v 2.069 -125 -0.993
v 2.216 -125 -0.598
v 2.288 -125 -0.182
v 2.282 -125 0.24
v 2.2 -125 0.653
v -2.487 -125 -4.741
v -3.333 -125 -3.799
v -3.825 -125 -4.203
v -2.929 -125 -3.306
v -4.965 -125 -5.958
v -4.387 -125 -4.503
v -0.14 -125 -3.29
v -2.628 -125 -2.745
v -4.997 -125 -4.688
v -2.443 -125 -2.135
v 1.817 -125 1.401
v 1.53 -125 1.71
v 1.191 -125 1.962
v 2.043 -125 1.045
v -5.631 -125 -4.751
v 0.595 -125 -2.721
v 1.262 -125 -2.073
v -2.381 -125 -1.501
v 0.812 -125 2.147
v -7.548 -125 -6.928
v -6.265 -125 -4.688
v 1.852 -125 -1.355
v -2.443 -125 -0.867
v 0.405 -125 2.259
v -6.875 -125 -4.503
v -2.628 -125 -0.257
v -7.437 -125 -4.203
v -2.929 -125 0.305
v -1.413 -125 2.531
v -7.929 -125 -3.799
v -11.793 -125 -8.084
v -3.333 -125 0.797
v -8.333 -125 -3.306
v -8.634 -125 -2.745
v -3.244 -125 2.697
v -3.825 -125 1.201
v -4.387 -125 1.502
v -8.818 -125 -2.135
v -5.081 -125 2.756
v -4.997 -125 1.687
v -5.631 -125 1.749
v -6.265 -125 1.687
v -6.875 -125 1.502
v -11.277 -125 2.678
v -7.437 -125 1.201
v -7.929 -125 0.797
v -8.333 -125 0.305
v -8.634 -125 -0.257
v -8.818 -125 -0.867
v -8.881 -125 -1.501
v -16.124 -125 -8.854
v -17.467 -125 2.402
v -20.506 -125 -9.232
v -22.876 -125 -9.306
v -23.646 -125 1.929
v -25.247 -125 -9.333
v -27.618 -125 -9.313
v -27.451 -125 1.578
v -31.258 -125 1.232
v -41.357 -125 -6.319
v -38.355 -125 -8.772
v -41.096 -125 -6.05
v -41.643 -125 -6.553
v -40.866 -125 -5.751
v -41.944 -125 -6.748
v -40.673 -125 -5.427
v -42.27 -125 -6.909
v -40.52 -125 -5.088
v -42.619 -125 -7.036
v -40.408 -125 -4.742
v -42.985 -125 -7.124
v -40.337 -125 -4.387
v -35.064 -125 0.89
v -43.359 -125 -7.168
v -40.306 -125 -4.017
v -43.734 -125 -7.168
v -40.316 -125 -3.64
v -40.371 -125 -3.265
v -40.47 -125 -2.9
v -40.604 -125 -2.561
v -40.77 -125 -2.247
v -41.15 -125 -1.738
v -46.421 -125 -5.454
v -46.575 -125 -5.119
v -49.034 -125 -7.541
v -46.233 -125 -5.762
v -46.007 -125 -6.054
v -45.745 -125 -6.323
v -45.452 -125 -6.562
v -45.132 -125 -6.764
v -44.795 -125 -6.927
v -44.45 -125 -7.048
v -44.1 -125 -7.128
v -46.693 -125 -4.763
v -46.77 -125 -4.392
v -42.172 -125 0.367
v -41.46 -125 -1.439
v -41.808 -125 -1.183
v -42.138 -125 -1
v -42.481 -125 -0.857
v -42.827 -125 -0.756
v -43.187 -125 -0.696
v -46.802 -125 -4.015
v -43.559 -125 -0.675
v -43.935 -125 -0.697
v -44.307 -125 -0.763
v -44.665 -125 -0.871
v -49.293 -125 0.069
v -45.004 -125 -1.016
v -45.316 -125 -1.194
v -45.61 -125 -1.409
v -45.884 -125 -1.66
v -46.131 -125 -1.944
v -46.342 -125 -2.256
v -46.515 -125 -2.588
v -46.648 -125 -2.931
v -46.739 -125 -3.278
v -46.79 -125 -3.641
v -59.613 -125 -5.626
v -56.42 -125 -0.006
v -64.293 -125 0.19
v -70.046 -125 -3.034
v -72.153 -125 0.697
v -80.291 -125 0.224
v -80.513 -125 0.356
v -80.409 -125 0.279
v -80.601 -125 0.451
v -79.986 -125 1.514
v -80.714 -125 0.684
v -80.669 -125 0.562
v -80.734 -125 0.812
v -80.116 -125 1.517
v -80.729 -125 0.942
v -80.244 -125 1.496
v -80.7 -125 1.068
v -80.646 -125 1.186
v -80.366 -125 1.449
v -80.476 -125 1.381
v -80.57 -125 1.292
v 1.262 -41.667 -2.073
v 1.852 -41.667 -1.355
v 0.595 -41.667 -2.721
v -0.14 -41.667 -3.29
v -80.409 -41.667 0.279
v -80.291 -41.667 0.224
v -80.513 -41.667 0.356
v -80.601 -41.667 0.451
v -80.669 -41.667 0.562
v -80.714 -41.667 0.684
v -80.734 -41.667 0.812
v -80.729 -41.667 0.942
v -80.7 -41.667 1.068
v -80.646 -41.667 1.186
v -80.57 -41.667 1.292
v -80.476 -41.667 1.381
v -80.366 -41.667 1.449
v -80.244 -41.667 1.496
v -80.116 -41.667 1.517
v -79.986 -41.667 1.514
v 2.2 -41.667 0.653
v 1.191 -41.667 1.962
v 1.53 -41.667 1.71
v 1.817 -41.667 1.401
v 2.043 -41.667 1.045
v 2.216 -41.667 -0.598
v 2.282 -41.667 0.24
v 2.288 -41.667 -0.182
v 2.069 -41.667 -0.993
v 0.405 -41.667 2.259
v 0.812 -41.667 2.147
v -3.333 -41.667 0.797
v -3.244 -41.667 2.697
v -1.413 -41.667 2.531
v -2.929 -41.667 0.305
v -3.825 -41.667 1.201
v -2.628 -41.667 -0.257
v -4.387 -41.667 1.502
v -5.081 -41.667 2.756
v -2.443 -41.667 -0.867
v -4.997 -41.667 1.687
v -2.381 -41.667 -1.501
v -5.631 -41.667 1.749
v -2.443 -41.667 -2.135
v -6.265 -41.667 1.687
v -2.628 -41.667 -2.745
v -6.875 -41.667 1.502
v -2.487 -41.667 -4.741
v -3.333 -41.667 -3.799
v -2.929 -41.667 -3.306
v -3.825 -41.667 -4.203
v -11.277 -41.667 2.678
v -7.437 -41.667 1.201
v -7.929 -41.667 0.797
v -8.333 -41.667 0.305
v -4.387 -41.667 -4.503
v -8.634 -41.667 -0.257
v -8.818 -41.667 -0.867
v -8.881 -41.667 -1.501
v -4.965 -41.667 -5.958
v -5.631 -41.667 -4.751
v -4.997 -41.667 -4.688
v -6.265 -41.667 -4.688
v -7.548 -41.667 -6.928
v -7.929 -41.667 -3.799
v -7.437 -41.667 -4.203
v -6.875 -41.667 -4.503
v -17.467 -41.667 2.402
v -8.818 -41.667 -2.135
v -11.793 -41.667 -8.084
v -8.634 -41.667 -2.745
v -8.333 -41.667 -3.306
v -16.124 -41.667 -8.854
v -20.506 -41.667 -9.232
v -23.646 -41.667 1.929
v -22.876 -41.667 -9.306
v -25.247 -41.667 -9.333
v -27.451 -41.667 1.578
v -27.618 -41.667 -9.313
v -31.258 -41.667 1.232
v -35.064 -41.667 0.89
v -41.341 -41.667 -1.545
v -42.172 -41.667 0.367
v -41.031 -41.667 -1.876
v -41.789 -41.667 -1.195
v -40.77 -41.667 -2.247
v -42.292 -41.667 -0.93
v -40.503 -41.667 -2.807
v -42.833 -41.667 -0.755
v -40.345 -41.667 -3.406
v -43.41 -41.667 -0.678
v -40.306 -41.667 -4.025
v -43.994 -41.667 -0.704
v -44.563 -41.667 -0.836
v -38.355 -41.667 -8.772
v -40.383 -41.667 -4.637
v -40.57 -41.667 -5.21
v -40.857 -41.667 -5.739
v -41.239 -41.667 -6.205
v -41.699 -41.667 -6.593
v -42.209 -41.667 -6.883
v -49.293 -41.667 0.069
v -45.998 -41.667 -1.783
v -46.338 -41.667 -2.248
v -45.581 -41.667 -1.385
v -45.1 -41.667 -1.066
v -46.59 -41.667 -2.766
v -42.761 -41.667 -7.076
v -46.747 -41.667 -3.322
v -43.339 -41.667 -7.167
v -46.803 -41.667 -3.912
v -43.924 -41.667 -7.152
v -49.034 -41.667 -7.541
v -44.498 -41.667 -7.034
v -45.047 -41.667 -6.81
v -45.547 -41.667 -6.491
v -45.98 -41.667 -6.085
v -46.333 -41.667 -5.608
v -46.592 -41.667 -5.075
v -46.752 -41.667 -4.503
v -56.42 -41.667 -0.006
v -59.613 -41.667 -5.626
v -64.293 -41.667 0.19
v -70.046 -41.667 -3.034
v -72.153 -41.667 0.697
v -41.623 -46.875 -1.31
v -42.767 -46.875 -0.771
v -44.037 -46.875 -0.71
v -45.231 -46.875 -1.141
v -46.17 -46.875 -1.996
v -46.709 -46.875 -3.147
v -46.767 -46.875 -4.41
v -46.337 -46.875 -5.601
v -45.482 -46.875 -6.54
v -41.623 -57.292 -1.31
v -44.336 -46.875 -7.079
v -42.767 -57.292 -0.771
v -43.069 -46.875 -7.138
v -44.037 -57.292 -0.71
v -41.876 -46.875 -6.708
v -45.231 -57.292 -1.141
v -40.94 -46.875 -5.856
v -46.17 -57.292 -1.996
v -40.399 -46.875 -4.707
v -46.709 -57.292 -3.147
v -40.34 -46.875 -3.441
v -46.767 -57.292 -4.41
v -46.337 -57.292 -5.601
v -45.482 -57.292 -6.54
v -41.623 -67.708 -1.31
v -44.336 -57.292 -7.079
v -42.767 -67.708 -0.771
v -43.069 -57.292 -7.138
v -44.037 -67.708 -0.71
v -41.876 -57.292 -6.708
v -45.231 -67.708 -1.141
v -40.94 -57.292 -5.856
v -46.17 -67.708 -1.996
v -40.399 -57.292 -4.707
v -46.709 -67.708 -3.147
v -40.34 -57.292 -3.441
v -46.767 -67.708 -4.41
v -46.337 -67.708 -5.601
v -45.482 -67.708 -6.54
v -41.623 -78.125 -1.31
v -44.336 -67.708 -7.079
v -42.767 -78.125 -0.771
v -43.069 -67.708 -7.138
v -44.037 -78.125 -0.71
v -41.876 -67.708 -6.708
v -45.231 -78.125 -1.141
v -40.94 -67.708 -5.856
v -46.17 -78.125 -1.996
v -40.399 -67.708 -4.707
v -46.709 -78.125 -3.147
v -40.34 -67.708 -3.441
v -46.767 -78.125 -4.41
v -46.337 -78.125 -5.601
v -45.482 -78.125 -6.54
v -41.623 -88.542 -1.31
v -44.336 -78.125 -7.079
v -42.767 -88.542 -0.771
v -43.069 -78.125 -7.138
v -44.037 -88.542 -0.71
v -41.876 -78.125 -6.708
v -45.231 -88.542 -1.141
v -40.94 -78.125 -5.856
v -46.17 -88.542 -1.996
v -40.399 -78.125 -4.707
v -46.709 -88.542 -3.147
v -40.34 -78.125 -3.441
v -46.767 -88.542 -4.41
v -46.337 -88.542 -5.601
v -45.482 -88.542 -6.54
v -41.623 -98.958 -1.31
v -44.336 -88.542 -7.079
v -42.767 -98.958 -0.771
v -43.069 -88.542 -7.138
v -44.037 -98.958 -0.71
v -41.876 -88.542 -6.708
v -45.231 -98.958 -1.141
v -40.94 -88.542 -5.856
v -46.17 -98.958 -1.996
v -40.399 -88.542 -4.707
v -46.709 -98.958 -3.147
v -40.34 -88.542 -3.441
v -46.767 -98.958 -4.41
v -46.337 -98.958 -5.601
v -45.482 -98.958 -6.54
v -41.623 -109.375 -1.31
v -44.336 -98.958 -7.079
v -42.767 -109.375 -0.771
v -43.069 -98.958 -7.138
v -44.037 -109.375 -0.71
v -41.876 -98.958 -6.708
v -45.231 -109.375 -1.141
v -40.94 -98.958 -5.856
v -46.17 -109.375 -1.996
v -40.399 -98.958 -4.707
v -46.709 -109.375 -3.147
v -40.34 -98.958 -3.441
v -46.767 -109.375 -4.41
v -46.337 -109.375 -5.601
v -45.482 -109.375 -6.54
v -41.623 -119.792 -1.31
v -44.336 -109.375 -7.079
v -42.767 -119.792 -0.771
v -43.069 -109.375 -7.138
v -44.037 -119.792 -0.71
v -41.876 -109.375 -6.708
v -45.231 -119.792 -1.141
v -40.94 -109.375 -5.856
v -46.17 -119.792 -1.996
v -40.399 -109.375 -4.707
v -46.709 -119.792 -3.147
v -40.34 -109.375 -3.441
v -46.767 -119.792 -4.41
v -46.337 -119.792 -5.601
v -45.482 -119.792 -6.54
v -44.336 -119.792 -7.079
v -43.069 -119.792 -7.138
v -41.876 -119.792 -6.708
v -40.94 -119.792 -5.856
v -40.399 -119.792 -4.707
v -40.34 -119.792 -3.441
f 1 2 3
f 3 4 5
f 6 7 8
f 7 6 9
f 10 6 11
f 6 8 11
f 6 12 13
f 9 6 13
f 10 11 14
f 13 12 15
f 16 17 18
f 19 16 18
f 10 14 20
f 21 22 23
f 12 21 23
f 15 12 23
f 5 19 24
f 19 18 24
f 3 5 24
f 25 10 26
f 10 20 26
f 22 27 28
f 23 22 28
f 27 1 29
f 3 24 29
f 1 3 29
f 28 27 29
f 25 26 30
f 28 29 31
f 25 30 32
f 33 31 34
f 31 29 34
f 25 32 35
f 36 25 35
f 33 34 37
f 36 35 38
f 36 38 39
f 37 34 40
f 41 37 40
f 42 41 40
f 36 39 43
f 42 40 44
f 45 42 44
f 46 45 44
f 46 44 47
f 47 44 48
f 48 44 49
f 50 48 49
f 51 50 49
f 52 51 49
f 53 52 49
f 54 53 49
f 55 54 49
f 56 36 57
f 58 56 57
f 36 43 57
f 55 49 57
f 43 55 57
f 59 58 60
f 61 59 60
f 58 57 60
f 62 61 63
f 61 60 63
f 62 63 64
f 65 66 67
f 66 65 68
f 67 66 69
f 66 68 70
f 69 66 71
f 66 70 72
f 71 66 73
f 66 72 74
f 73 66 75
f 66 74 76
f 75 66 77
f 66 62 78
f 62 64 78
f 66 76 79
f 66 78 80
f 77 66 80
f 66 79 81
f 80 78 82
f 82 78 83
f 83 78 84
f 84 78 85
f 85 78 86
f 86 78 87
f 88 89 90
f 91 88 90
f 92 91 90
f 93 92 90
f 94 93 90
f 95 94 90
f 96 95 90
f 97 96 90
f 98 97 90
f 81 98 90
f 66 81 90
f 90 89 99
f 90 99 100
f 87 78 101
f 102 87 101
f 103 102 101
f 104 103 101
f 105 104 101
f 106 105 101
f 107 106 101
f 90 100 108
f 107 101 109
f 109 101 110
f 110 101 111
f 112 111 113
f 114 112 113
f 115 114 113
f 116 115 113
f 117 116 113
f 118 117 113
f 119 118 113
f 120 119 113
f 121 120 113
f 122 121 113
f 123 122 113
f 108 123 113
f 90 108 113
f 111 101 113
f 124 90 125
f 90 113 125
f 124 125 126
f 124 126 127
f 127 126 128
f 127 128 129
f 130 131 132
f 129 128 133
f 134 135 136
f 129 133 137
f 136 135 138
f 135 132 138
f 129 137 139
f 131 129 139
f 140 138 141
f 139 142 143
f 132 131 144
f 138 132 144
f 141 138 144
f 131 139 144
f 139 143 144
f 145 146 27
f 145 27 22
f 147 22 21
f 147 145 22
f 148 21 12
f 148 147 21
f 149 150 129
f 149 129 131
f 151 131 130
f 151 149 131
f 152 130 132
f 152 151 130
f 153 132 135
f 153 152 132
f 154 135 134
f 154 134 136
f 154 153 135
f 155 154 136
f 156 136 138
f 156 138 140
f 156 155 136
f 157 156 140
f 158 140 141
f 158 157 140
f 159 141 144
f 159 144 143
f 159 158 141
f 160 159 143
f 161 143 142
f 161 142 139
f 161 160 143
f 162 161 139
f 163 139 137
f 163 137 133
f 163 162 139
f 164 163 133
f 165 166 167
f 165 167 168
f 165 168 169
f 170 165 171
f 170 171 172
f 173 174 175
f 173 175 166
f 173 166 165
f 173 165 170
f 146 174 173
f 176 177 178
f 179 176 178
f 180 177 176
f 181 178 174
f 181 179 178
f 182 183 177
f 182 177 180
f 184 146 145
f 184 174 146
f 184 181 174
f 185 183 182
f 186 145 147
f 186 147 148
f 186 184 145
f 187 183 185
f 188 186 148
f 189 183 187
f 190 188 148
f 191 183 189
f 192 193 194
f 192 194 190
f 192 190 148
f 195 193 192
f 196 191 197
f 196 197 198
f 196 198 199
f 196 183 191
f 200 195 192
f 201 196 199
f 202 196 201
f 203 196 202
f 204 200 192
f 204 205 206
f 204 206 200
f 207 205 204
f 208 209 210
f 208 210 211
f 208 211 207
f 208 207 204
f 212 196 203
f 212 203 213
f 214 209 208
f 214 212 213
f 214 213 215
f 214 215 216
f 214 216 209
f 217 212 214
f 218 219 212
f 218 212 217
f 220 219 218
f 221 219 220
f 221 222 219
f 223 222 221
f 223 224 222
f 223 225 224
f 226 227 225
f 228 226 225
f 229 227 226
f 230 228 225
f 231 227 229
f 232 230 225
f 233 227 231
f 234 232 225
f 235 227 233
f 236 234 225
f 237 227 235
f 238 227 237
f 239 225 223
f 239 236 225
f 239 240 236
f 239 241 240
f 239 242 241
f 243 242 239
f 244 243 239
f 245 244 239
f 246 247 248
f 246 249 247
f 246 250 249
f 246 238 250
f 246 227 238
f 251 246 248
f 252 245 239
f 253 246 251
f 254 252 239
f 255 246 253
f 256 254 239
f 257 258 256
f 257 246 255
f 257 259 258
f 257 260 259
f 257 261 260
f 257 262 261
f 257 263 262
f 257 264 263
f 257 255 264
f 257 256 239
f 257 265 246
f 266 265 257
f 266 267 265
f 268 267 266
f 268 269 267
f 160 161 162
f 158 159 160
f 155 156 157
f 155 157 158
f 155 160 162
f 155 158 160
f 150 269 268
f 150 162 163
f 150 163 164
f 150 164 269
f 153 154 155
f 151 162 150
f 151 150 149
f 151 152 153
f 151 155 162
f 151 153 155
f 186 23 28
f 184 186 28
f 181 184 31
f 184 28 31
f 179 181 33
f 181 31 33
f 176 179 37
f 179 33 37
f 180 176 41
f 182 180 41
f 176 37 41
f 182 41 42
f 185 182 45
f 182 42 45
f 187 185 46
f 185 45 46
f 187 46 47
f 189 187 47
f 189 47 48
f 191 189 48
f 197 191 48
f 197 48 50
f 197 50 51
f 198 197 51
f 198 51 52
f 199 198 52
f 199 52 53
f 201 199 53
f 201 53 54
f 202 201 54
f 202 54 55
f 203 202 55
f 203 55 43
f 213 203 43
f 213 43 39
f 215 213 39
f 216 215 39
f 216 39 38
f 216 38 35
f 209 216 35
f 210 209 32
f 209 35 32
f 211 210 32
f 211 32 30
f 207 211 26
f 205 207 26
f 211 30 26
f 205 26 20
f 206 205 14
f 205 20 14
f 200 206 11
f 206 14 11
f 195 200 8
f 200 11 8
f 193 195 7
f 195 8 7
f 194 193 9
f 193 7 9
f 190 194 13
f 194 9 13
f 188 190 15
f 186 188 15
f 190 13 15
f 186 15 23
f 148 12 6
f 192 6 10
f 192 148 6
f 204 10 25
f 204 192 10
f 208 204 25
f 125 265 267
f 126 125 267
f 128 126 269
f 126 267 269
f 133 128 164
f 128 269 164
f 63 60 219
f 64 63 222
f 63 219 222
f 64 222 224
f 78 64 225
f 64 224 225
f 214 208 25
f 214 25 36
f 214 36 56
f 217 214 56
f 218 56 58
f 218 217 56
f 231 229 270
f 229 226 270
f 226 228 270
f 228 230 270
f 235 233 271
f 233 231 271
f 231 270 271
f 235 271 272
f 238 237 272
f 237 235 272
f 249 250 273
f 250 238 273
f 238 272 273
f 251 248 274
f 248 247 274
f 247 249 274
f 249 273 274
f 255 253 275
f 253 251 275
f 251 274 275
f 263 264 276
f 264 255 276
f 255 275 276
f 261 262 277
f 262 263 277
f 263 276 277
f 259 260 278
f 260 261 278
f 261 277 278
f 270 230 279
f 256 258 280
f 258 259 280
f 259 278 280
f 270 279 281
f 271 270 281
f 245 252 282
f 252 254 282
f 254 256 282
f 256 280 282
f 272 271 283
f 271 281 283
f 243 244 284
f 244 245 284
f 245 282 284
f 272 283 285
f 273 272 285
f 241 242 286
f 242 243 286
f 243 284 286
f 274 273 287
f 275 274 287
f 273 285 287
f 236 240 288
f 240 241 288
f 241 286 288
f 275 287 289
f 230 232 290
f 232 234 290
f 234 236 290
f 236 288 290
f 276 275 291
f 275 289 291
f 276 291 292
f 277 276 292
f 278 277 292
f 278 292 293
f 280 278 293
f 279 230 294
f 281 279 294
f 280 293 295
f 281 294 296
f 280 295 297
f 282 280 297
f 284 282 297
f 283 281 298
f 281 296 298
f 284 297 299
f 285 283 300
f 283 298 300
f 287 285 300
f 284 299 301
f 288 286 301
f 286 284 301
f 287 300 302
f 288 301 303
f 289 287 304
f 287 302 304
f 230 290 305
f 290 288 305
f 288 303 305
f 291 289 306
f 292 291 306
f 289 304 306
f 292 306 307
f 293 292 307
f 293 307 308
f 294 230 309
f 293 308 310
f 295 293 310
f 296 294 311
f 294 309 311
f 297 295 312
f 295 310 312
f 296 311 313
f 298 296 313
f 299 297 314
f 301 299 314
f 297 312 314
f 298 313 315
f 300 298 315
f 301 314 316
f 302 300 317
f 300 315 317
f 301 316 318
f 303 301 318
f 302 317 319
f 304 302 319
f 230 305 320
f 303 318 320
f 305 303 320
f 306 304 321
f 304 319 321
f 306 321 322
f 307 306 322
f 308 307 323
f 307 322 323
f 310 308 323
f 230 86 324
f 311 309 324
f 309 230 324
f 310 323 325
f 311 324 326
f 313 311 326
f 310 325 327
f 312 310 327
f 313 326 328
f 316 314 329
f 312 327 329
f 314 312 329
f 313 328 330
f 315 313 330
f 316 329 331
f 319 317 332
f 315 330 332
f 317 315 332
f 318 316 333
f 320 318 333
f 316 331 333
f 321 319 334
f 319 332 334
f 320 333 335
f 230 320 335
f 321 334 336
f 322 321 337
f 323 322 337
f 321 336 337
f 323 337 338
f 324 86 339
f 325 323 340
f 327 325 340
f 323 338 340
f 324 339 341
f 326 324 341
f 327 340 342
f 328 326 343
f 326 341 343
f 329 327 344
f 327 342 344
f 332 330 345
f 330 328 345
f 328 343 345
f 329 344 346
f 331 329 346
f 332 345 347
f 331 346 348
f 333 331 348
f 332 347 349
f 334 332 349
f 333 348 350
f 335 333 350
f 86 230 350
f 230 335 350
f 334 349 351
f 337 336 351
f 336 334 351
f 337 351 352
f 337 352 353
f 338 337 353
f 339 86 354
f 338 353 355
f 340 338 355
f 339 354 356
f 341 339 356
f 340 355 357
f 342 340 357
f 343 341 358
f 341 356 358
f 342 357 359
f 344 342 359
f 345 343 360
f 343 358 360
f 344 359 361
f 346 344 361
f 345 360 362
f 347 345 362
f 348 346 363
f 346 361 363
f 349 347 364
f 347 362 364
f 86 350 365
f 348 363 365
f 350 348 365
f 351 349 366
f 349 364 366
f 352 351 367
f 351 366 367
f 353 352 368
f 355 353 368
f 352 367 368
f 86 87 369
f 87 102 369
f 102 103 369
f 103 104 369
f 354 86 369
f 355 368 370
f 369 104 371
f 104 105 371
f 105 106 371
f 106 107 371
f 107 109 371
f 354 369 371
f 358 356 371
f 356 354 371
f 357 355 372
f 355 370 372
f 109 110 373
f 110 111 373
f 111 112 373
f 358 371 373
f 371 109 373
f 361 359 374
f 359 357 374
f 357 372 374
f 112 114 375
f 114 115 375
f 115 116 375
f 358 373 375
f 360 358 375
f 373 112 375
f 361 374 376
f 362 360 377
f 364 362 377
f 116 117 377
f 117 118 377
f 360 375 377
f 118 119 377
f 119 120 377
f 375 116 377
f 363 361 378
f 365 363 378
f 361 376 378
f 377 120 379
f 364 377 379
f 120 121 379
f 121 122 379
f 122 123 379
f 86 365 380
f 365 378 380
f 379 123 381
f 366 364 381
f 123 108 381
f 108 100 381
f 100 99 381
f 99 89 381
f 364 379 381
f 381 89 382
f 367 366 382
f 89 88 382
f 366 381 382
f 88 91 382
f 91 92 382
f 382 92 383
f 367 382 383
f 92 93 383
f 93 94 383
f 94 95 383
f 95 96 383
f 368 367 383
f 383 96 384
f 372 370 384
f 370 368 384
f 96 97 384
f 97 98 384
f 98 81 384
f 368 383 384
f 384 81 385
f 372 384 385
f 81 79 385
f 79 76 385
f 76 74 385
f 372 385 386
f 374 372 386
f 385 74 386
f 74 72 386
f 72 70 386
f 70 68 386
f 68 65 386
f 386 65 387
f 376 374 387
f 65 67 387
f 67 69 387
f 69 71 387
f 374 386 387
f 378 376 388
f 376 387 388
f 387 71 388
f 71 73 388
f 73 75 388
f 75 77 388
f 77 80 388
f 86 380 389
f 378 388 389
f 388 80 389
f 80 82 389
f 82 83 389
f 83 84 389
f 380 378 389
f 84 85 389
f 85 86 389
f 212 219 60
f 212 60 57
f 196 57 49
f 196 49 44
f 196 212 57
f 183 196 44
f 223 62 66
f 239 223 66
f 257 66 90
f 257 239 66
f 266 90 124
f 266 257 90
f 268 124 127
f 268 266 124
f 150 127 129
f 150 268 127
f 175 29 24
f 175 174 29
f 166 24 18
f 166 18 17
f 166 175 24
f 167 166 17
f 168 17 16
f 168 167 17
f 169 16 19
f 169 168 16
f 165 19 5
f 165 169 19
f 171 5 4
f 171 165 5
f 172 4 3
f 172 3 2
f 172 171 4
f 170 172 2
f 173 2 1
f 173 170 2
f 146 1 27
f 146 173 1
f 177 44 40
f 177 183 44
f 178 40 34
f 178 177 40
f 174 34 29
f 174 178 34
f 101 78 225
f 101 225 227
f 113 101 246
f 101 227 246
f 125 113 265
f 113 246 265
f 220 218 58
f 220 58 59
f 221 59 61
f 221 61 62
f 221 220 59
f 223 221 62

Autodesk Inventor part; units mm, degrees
ref_plane "YZ Plane" through (0, 0, 0) normal (1, 0, 0) x (0, 1, 0)
ref_plane "XZ Plane" through (0, 0, 0) normal (0, 1, 0) x (-1, 0, 0)
sketch "スケッチ1" plane through (0, 0, 0) normal (0, 1, 0) x (-1, 0, 0)
  circle A0 centre (56.6667, -3.3333) radius 2 projected
  circle A1 centre (6.6667, -1.3333) radius 2 projected
  arc A2 (27.618, -9.313) -> (80.2911, 0.2239) centre (24.5838, 157.671) ccw projected
  arc A3 (20.5062, -9.2317) -> (27.618, -9.313) centre (25.435, 110.8283) ccw projected
  arc A4 (7.5483, -6.9284) -> (20.5062, -9.2317) centre (22.5133, 39.66) ccw projected
  arc A5 (0.14, -3.2897) -> (7.5483, -6.9284) centre (16.2383, 20.125) ccw projected
  arc A6 (-1.8521, -1.3552) -> (0.14, -3.2897) centre (4.8333, 3.5367) ccw projected
  arc A7 (-0.4054, 2.2589) -> (-1.8521, -1.3552) centre (0, 0) ccw projected
  arc A8 (5.081, 2.7563) -> (-0.4054, 2.2589) centre (5.1833, -28.88) ccw projected
  arc A9 (23.6457, 1.9287) -> (5.081, 2.7563) centre (5.71, -191.7767) ccw projected
  arc A10 (23.6457, 1.9287) -> (35.0642, 0.89) centre (351.2983, 3540.5833) ccw projected
  arc A11 (35.0642, 0.89) -> (56.4197, -0.0064) centre (55.24, 226.7233) ccw projected
  arc A12 (56.4197, -0.0064) -> (79.9865, 1.514) centre (55.3817, 199.4967) ccw projected
  arc A13 (80.2911, 0.2239) -> (79.9865, 1.514) centre (80.0687, 0.8524) ccw projected
extrude "押し出し1" add sketch "スケッチ1" along normal mid plane 250 contours A0 | A1 | A3 A4 A5 A6 A7 A8 A9 A10 A11 A12 A13 A2
ref_plane "作業平面1" through (-121.5758, 135, -17.9326) normal (0.516, 0, -0.8566) x (0.8566, 0, 0.516)
sketch "スケッチ4" plane through (-121.5758, 135, -17.9326) normal (0.516, 0, -0.8566) x (0.8566, 0, 0.516)
  arc A0 (90, 35) -> (0, 0) centre (90, -98.2143) ccw projected
  line L0 (183.3333, 35) -> (90, 35) projected
  line L1 (183.3333, 35) -> (183.3333, 0)
  line L2 (183.3333, 0) -> (0, 0)
  point P0 (113.3913, 135)
extrude "押し出し4" cut sketch "スケッチ4" along normal through all
sketch "スケッチ5" plane through (0, 0, 0) normal (1, 0, 0) x (0, 1, 0)
  line L0 (0, 39.4691) -> (142.1366, 39.4691)
  line L1 (142.1366, 39.4691) -> (142.1366, -52.6862)
  line L2 (142.1366, -52.6862) -> (0, -52.6862)
  line L3 (0, -52.6862) -> (0, 39.4691)
  line L4 (-125, 0.2239) -> (-125, -9.313) projected
  line L5 (-125, -9.313) -> (-125, -9.2317) projected
  line L6 (-125, -9.2317) -> (-125, -6.9284) projected
  line L7 (-125, -6.9284) -> (-125, -3.2897) projected
  line L8 (-125, -3.2897) -> (-125, -1.3552) projected
  line L9 (-125, -1.3552) -> (-125, 2.2589) projected
  line L10 (-125, 2.2589) -> (-125, 2.7563) projected
  line L11 (-125, 2.7563) -> (-125, 1.9287) projected
  line L12 (-125, 1.9287) -> (-125, 0.89) projected
  line L13 (-125, 0.89) -> (-125, -0.0064) projected
  line L14 (-125, -0.0064) -> (-125, 1.514) projected
  line L15 (-125, 1.514) -> (-125, 0.2239) projected
  line L16 (0, -36.0696) -> (0, 32.8586) projected
  line L17 (0, 32.7819) -> (-41.6667, 32.7819)
  line L18 (-41.6667, 32.7819) -> (-41.6667, -50.6187)
  line L19 (-41.6667, -50.6187) -> (0, -50.6187)
  line L20 (0, -50.6187) -> (0, 32.7819)
  point P0 (0, 0)
  dimension "d19" = 41.6667
extrude "押し出し5" cut sketch "スケッチ5" along normal through all both and the other way through all
sketch "スケッチ6" plane through (0, -125, 0) normal (0, -1, 0) x (1, 0, 0)
  spline S0 degree 3 poles (-40.7697, -2.2472) (-40.9802, -1.8978) (-41.2745, -1.5673) (-41.9707, -1.053) (-42.3727, -0.8692) (-43.1649, -0.6717) (-43.6081, -0.6459) (-44.4664, -0.7751) (-44.8814, -0.9301) (-45.5808, -1.3514) (-45.9119, -1.6464) (-46.4272, -2.3453) (-46.6113, -2.7493) (-46.8063, -3.5414) (-46.8317, -3.9821) (-46.7025, -4.8374) (-46.5479, -5.252) (-46.1263, -5.9517) (-45.8313, -6.2827) (-45.1337, -6.7972) (-44.7311, -6.9807) (-43.9393, -7.1771) (-43.4971, -7.2026) (-42.6403, -7.0733) (-42.2257, -6.9186) (-41.5276, -6.498) (-41.1971, -6.2041) (-40.6821, -5.507) (-40.4976, -5.1039) (-40.3011, -4.3114) (-40.2752, -3.8695) (-40.4041, -3.0124) (-40.5589, -2.5971) (-40.7697, -2.2472) knots 0 0 0 0 0.122368 0.122368 0.244736 0.244736 0.367956 0.367956 0.491176 0.491176 0.61468 0.61468 0.738183 0.738183 0.86058 0.86058 0.982977 0.982977 1.105654 1.105654 1.228331 1.228331 1.351555 1.351555 1.474779 1.474779 1.597815 1.597815 1.72085 1.72085 1.843403 1.843403 1.965955 1.965955 1.965955 1.965955 projected
  circle A0 centre (-5.6309, -1.5008) radius 3.25 projected
  point P0 (0, 0)
  point P1 (-40.7697, -2.2472)
extrude "押し出し6" cut sketch "スケッチ6" against normal through all
properties part number "newsubflap"
